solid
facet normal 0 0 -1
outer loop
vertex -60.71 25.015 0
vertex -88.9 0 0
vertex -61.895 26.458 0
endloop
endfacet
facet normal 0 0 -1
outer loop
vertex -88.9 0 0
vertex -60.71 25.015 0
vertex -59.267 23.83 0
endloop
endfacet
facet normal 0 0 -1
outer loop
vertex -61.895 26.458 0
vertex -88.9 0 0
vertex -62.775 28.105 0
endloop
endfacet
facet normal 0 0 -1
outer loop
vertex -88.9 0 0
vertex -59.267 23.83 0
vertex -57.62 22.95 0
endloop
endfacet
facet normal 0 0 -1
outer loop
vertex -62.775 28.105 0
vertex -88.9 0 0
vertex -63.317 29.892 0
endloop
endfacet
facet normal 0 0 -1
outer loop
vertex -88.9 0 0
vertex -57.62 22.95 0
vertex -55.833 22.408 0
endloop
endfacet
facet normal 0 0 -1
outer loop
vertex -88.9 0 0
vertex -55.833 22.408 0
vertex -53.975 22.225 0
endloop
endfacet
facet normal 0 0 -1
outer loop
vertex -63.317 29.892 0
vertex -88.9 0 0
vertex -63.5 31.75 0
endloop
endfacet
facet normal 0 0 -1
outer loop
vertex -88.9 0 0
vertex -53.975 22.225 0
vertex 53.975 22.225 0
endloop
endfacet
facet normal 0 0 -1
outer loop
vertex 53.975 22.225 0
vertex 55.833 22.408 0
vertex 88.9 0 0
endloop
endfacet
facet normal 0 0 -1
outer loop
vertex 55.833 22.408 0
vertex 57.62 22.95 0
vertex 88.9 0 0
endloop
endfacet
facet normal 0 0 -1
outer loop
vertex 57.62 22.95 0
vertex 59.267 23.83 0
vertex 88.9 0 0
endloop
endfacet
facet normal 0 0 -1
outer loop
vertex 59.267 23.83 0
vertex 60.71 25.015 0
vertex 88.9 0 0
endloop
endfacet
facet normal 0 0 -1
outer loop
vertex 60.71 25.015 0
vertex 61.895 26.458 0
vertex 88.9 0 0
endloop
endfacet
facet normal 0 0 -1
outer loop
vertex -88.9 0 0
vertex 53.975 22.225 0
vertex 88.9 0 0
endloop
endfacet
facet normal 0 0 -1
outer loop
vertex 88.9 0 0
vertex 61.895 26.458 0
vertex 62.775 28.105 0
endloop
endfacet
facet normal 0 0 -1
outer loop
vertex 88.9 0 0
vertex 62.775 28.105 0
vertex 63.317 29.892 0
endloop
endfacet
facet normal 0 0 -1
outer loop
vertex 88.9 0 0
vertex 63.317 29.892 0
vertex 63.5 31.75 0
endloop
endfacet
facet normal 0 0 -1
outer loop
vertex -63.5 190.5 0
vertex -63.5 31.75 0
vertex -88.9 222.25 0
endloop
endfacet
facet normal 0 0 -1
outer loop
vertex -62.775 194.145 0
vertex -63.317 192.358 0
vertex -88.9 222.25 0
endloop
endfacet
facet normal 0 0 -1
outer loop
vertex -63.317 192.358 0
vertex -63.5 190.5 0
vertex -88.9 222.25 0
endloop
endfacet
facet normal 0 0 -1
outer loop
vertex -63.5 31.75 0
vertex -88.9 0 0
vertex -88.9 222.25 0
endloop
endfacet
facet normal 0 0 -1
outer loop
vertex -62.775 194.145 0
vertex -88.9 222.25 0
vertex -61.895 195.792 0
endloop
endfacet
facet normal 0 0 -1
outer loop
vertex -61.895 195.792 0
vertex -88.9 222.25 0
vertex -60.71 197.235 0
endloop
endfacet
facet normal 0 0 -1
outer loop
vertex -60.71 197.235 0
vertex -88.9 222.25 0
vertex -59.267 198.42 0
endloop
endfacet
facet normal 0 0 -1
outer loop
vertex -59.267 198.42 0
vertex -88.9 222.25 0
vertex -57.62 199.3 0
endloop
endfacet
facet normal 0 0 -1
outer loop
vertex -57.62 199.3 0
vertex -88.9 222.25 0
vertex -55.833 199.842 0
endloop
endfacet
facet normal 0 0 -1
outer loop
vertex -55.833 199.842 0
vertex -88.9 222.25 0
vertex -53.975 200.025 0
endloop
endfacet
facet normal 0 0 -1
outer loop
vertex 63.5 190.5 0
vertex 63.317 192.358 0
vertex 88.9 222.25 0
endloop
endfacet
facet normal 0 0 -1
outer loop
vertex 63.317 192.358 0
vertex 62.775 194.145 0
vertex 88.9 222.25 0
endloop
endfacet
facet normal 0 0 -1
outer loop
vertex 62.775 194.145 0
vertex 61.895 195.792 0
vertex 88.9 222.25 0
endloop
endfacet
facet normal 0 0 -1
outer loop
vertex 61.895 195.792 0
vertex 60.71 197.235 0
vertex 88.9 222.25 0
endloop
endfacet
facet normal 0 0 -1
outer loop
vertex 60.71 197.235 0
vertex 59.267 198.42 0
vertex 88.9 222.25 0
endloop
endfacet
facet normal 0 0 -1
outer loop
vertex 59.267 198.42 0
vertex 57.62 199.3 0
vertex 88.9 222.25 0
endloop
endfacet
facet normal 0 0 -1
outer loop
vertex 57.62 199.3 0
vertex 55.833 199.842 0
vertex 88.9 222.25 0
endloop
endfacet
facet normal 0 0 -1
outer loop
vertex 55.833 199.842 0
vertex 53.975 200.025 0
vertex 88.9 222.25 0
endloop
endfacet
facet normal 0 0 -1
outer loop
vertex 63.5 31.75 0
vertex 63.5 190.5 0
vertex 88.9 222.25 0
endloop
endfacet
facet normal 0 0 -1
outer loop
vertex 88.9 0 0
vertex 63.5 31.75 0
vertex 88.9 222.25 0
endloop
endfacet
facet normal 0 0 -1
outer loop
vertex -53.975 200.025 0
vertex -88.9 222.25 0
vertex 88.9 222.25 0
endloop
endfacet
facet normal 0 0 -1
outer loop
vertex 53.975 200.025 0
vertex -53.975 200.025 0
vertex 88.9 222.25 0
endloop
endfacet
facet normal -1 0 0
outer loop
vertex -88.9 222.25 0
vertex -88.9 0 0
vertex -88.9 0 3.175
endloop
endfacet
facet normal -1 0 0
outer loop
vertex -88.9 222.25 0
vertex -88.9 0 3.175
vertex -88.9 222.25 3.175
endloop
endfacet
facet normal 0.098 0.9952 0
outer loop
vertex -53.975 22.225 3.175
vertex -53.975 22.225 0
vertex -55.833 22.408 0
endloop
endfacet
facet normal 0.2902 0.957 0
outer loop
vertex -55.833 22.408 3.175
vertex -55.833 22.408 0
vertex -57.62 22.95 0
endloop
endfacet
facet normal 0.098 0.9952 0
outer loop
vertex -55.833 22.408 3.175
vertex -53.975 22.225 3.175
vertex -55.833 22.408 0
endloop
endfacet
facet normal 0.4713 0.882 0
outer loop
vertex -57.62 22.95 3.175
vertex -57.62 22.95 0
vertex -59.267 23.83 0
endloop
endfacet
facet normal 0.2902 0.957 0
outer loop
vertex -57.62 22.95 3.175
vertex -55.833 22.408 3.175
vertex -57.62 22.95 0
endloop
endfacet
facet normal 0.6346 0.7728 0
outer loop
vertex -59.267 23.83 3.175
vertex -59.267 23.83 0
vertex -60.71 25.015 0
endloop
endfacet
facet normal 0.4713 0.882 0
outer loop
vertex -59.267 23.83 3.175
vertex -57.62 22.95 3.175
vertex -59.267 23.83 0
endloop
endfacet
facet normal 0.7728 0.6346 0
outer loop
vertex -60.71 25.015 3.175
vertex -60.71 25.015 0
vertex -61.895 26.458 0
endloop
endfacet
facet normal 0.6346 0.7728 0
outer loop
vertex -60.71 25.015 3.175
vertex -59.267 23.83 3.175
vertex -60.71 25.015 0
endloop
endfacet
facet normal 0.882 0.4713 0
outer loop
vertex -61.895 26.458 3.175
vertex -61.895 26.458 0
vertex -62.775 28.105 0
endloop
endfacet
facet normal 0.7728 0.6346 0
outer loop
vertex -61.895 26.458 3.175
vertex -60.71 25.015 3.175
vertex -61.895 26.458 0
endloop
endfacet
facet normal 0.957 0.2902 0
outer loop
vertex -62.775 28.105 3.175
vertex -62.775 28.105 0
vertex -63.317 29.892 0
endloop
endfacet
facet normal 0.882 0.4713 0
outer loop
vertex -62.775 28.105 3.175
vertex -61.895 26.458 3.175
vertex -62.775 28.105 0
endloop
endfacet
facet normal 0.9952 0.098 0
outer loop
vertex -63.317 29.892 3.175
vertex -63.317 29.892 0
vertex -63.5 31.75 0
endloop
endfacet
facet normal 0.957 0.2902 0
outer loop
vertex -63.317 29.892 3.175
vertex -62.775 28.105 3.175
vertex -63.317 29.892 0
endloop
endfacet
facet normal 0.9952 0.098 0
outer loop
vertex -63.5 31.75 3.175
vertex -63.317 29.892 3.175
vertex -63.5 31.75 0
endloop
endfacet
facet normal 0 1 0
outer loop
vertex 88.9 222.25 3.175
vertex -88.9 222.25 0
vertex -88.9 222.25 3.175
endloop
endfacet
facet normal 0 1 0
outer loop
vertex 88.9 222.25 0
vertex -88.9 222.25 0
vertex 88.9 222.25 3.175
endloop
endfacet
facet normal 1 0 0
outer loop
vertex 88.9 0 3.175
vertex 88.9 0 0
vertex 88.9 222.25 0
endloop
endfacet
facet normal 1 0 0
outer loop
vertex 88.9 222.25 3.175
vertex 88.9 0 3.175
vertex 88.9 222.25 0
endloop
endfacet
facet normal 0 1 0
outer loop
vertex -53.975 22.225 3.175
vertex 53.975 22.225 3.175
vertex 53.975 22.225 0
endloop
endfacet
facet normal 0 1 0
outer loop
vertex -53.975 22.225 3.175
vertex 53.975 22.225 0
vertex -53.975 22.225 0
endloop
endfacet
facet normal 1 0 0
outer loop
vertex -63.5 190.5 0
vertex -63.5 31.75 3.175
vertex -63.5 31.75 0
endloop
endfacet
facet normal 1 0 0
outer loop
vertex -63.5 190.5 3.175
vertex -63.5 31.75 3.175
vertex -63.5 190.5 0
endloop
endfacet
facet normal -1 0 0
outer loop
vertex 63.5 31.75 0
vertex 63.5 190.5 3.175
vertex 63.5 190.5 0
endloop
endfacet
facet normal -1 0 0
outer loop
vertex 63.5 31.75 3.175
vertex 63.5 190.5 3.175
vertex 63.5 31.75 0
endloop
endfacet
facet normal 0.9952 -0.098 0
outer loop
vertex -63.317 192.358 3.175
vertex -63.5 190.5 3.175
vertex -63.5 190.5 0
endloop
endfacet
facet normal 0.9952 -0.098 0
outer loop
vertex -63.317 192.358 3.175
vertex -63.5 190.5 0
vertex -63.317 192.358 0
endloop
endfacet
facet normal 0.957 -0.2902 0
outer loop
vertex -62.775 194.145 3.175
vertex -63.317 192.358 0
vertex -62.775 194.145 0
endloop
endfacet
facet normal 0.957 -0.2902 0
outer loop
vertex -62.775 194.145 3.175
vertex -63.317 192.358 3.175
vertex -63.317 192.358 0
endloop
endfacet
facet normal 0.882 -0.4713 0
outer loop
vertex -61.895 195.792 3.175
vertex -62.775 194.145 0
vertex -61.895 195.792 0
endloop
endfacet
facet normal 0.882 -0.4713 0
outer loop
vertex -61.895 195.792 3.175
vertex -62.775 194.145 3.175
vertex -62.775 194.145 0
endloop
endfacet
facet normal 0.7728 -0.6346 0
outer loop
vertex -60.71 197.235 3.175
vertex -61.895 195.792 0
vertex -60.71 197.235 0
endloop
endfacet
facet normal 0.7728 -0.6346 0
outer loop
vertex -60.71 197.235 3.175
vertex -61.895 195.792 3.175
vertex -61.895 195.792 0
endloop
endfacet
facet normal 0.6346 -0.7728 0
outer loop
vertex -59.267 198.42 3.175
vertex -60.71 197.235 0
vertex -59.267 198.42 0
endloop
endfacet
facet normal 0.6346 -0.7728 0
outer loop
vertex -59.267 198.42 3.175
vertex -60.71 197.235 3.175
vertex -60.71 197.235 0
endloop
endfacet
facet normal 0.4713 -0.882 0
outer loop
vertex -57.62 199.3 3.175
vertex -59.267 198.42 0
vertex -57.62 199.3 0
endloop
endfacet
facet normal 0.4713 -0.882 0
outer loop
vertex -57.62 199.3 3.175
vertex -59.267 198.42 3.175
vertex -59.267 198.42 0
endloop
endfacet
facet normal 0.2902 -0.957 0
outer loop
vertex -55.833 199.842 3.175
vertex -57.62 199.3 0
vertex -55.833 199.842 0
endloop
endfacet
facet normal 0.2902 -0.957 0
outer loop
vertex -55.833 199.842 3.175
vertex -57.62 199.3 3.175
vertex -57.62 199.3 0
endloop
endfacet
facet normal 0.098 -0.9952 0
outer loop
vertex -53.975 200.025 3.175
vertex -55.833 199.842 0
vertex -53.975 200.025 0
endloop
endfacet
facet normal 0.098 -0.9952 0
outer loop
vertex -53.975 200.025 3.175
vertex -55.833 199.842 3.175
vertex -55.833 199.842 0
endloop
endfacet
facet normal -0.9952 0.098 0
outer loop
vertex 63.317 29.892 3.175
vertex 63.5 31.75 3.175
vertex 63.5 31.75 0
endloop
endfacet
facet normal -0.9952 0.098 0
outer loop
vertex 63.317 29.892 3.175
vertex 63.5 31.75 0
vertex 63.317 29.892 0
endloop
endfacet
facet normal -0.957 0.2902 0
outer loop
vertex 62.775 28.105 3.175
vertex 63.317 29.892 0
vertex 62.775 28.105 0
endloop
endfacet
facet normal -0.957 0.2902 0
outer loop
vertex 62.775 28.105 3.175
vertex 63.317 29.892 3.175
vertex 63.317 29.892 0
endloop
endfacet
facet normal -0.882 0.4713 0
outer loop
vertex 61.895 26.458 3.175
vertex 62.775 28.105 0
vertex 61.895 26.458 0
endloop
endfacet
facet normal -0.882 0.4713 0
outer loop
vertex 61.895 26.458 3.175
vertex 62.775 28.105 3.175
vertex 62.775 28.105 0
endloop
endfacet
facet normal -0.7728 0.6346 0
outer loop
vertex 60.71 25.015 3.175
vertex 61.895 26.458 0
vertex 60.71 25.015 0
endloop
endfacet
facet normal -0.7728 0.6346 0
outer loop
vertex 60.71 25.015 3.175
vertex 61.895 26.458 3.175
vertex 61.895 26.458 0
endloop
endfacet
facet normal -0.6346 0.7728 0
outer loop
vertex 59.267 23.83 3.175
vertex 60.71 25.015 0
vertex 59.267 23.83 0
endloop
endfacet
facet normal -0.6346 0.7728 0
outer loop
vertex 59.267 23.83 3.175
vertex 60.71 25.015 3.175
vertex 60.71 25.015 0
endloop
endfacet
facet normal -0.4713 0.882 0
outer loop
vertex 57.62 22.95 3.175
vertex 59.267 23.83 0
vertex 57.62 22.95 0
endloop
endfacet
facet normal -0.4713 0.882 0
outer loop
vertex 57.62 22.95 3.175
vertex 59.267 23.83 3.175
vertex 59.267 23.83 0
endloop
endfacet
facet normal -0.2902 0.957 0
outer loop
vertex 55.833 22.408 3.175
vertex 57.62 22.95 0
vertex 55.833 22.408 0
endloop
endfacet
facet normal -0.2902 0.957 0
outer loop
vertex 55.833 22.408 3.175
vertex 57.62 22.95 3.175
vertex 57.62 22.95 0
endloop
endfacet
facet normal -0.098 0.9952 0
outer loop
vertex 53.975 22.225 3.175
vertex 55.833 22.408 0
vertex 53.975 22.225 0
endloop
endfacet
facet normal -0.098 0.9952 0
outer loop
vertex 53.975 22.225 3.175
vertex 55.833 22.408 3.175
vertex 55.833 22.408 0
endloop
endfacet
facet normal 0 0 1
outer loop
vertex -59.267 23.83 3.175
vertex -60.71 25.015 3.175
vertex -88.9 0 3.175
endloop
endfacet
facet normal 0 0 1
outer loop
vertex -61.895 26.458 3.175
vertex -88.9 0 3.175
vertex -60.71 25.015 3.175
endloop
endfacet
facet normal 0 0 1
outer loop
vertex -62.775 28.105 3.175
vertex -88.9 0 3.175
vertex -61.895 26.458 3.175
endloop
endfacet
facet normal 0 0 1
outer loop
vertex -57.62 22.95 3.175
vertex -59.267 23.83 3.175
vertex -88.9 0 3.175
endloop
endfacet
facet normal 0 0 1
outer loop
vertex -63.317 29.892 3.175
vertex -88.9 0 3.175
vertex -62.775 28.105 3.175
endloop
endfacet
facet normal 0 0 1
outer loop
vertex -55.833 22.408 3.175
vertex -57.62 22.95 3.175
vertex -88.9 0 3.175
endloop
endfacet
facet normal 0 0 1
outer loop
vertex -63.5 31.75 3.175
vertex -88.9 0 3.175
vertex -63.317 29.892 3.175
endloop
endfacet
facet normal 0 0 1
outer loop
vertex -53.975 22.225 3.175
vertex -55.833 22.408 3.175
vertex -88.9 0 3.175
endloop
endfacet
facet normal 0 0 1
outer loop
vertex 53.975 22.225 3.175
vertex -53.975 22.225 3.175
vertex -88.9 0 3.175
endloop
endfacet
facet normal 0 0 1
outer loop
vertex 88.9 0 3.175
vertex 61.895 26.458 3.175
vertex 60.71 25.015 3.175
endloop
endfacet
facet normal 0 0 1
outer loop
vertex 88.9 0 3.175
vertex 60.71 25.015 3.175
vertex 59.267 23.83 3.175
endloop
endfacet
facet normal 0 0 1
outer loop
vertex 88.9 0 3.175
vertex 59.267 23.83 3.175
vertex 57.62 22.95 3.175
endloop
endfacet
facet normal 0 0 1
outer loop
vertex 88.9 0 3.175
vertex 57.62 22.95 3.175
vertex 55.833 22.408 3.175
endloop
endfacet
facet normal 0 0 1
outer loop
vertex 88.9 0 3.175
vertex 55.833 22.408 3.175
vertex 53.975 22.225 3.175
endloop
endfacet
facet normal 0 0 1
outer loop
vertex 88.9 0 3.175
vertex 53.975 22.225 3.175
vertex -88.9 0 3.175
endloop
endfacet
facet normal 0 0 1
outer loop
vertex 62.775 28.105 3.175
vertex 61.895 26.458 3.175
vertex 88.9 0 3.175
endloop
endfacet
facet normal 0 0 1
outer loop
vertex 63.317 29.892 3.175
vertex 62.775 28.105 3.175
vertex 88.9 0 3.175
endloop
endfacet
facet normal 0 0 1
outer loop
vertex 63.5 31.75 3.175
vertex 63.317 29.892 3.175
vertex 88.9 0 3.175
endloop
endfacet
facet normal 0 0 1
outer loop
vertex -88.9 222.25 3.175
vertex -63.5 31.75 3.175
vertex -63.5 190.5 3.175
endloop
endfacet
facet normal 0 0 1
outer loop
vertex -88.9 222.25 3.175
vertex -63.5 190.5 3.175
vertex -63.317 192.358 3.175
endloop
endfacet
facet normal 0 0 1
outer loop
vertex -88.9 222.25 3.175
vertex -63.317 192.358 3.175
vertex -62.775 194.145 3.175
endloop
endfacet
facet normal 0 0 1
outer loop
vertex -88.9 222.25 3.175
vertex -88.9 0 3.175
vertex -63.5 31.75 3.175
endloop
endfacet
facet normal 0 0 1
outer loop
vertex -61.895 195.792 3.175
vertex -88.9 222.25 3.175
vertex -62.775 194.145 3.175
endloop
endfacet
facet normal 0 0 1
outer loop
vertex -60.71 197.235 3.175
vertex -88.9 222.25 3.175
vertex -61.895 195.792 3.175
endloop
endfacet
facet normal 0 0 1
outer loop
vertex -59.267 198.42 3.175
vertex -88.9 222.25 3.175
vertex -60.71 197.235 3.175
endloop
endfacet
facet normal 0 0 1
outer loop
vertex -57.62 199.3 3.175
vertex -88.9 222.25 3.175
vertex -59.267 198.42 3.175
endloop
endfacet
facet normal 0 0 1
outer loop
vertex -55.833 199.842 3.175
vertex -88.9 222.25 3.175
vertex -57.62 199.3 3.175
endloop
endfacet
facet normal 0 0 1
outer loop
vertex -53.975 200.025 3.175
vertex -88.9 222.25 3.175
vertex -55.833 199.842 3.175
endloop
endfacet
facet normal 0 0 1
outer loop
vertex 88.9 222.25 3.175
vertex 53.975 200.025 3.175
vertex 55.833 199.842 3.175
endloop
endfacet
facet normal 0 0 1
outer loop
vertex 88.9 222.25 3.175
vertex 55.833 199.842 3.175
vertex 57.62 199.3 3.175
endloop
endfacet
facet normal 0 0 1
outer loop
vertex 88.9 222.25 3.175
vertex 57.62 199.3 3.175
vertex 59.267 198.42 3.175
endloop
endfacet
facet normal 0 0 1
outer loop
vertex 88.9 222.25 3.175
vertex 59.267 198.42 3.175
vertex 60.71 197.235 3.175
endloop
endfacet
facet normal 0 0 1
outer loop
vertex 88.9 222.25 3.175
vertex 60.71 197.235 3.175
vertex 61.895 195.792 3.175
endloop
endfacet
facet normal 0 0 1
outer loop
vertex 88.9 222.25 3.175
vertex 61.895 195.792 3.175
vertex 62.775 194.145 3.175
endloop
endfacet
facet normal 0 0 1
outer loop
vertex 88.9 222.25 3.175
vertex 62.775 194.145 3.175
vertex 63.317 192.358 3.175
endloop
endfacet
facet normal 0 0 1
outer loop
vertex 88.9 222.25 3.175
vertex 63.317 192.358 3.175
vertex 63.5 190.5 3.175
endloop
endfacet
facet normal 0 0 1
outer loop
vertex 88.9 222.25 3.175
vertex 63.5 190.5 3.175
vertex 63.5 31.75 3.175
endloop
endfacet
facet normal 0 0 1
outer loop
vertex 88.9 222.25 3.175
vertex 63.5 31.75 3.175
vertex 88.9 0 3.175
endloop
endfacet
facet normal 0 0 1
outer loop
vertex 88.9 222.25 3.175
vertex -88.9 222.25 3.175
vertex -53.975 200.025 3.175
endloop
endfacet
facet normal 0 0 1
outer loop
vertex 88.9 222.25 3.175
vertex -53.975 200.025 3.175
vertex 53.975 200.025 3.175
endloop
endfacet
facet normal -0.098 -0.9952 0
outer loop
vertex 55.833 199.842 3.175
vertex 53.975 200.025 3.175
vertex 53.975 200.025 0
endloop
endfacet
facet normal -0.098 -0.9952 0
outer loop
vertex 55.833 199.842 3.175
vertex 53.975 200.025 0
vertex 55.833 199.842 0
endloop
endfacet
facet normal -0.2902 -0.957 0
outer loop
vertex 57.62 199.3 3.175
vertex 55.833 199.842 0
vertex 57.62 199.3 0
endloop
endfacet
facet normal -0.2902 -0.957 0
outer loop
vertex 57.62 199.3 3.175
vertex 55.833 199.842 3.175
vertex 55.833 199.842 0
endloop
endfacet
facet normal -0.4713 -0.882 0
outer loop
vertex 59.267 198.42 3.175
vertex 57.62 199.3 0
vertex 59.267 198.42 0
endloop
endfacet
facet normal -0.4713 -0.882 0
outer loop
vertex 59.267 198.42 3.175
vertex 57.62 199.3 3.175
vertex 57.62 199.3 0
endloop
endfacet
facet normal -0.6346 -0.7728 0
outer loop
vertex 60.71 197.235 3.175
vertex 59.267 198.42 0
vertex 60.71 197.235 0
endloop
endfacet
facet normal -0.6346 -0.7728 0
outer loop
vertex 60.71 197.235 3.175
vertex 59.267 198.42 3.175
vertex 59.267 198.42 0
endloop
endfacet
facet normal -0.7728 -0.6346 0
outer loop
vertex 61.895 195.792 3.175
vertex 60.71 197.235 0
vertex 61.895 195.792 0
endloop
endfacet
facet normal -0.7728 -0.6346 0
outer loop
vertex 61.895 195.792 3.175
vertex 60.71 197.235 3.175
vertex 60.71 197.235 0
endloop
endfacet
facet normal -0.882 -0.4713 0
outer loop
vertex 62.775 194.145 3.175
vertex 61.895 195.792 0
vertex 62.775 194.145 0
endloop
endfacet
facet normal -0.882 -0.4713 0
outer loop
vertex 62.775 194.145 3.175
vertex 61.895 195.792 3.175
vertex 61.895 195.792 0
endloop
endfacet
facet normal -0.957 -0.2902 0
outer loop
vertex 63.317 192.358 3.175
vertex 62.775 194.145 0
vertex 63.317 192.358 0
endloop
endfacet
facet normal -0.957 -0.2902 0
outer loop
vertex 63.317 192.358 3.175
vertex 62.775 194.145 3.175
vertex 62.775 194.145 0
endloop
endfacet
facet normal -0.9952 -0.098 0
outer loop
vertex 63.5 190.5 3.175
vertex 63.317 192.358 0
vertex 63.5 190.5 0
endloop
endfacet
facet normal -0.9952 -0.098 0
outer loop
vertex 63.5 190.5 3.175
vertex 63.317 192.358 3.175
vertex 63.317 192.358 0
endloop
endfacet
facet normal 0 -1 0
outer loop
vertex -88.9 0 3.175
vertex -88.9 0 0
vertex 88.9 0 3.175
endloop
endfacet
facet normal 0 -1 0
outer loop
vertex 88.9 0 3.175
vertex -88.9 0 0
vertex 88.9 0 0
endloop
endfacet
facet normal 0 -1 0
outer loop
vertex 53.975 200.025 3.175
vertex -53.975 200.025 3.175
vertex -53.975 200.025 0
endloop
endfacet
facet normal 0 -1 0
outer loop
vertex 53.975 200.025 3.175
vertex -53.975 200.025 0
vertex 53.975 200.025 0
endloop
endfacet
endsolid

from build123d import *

# Parameters (mm, degrees)
SKETCH1_W           = 177.8
SKETCH1_H           = 222.25
BOSS_EXTRUDE1_DEPTH = 3.175
CUT_EXTRUDE1_DEPTH  = 240.391631276


with BuildPart() as part:
    # Sketch1 → Boss-Extrude1 (new body)
    with BuildSketch(Plane.XY):
        with Locations((0, 111.125)):
            Rectangle(SKETCH1_W, SKETCH1_H)
    extrude(amount=BOSS_EXTRUDE1_DEPTH)

    # Sketch2 → Cut-Extrude1 (cut, through all)
    with BuildSketch(Plane.XY.offset(3.175)):
        with BuildLine():
            Line((53.975, 22.225), (-53.975, 22.225))
            ThreePointArc((-53.975, 22.225), (-60.710192091, 25.014807909), (-63.5, 31.75))
            Line((-63.5, 31.75), (-63.5, 190.5))
            ThreePointArc((-63.5, 190.5), (-60.710192091, 197.235192091), (-53.975, 200.025))
            Line((-53.975, 200.025), (53.975, 200.025))
            ThreePointArc((53.975, 200.025), (60.710192091, 197.235192091), (63.5, 190.5))
            Line((63.5, 190.5), (63.5, 31.75))
            ThreePointArc((63.5, 31.75), (60.710192091, 25.014807909), (53.975, 22.225))
        make_face()
    extrude(amount=-CUT_EXTRUDE1_DEPTH, mode=Mode.SUBTRACT)


solid = part.part
